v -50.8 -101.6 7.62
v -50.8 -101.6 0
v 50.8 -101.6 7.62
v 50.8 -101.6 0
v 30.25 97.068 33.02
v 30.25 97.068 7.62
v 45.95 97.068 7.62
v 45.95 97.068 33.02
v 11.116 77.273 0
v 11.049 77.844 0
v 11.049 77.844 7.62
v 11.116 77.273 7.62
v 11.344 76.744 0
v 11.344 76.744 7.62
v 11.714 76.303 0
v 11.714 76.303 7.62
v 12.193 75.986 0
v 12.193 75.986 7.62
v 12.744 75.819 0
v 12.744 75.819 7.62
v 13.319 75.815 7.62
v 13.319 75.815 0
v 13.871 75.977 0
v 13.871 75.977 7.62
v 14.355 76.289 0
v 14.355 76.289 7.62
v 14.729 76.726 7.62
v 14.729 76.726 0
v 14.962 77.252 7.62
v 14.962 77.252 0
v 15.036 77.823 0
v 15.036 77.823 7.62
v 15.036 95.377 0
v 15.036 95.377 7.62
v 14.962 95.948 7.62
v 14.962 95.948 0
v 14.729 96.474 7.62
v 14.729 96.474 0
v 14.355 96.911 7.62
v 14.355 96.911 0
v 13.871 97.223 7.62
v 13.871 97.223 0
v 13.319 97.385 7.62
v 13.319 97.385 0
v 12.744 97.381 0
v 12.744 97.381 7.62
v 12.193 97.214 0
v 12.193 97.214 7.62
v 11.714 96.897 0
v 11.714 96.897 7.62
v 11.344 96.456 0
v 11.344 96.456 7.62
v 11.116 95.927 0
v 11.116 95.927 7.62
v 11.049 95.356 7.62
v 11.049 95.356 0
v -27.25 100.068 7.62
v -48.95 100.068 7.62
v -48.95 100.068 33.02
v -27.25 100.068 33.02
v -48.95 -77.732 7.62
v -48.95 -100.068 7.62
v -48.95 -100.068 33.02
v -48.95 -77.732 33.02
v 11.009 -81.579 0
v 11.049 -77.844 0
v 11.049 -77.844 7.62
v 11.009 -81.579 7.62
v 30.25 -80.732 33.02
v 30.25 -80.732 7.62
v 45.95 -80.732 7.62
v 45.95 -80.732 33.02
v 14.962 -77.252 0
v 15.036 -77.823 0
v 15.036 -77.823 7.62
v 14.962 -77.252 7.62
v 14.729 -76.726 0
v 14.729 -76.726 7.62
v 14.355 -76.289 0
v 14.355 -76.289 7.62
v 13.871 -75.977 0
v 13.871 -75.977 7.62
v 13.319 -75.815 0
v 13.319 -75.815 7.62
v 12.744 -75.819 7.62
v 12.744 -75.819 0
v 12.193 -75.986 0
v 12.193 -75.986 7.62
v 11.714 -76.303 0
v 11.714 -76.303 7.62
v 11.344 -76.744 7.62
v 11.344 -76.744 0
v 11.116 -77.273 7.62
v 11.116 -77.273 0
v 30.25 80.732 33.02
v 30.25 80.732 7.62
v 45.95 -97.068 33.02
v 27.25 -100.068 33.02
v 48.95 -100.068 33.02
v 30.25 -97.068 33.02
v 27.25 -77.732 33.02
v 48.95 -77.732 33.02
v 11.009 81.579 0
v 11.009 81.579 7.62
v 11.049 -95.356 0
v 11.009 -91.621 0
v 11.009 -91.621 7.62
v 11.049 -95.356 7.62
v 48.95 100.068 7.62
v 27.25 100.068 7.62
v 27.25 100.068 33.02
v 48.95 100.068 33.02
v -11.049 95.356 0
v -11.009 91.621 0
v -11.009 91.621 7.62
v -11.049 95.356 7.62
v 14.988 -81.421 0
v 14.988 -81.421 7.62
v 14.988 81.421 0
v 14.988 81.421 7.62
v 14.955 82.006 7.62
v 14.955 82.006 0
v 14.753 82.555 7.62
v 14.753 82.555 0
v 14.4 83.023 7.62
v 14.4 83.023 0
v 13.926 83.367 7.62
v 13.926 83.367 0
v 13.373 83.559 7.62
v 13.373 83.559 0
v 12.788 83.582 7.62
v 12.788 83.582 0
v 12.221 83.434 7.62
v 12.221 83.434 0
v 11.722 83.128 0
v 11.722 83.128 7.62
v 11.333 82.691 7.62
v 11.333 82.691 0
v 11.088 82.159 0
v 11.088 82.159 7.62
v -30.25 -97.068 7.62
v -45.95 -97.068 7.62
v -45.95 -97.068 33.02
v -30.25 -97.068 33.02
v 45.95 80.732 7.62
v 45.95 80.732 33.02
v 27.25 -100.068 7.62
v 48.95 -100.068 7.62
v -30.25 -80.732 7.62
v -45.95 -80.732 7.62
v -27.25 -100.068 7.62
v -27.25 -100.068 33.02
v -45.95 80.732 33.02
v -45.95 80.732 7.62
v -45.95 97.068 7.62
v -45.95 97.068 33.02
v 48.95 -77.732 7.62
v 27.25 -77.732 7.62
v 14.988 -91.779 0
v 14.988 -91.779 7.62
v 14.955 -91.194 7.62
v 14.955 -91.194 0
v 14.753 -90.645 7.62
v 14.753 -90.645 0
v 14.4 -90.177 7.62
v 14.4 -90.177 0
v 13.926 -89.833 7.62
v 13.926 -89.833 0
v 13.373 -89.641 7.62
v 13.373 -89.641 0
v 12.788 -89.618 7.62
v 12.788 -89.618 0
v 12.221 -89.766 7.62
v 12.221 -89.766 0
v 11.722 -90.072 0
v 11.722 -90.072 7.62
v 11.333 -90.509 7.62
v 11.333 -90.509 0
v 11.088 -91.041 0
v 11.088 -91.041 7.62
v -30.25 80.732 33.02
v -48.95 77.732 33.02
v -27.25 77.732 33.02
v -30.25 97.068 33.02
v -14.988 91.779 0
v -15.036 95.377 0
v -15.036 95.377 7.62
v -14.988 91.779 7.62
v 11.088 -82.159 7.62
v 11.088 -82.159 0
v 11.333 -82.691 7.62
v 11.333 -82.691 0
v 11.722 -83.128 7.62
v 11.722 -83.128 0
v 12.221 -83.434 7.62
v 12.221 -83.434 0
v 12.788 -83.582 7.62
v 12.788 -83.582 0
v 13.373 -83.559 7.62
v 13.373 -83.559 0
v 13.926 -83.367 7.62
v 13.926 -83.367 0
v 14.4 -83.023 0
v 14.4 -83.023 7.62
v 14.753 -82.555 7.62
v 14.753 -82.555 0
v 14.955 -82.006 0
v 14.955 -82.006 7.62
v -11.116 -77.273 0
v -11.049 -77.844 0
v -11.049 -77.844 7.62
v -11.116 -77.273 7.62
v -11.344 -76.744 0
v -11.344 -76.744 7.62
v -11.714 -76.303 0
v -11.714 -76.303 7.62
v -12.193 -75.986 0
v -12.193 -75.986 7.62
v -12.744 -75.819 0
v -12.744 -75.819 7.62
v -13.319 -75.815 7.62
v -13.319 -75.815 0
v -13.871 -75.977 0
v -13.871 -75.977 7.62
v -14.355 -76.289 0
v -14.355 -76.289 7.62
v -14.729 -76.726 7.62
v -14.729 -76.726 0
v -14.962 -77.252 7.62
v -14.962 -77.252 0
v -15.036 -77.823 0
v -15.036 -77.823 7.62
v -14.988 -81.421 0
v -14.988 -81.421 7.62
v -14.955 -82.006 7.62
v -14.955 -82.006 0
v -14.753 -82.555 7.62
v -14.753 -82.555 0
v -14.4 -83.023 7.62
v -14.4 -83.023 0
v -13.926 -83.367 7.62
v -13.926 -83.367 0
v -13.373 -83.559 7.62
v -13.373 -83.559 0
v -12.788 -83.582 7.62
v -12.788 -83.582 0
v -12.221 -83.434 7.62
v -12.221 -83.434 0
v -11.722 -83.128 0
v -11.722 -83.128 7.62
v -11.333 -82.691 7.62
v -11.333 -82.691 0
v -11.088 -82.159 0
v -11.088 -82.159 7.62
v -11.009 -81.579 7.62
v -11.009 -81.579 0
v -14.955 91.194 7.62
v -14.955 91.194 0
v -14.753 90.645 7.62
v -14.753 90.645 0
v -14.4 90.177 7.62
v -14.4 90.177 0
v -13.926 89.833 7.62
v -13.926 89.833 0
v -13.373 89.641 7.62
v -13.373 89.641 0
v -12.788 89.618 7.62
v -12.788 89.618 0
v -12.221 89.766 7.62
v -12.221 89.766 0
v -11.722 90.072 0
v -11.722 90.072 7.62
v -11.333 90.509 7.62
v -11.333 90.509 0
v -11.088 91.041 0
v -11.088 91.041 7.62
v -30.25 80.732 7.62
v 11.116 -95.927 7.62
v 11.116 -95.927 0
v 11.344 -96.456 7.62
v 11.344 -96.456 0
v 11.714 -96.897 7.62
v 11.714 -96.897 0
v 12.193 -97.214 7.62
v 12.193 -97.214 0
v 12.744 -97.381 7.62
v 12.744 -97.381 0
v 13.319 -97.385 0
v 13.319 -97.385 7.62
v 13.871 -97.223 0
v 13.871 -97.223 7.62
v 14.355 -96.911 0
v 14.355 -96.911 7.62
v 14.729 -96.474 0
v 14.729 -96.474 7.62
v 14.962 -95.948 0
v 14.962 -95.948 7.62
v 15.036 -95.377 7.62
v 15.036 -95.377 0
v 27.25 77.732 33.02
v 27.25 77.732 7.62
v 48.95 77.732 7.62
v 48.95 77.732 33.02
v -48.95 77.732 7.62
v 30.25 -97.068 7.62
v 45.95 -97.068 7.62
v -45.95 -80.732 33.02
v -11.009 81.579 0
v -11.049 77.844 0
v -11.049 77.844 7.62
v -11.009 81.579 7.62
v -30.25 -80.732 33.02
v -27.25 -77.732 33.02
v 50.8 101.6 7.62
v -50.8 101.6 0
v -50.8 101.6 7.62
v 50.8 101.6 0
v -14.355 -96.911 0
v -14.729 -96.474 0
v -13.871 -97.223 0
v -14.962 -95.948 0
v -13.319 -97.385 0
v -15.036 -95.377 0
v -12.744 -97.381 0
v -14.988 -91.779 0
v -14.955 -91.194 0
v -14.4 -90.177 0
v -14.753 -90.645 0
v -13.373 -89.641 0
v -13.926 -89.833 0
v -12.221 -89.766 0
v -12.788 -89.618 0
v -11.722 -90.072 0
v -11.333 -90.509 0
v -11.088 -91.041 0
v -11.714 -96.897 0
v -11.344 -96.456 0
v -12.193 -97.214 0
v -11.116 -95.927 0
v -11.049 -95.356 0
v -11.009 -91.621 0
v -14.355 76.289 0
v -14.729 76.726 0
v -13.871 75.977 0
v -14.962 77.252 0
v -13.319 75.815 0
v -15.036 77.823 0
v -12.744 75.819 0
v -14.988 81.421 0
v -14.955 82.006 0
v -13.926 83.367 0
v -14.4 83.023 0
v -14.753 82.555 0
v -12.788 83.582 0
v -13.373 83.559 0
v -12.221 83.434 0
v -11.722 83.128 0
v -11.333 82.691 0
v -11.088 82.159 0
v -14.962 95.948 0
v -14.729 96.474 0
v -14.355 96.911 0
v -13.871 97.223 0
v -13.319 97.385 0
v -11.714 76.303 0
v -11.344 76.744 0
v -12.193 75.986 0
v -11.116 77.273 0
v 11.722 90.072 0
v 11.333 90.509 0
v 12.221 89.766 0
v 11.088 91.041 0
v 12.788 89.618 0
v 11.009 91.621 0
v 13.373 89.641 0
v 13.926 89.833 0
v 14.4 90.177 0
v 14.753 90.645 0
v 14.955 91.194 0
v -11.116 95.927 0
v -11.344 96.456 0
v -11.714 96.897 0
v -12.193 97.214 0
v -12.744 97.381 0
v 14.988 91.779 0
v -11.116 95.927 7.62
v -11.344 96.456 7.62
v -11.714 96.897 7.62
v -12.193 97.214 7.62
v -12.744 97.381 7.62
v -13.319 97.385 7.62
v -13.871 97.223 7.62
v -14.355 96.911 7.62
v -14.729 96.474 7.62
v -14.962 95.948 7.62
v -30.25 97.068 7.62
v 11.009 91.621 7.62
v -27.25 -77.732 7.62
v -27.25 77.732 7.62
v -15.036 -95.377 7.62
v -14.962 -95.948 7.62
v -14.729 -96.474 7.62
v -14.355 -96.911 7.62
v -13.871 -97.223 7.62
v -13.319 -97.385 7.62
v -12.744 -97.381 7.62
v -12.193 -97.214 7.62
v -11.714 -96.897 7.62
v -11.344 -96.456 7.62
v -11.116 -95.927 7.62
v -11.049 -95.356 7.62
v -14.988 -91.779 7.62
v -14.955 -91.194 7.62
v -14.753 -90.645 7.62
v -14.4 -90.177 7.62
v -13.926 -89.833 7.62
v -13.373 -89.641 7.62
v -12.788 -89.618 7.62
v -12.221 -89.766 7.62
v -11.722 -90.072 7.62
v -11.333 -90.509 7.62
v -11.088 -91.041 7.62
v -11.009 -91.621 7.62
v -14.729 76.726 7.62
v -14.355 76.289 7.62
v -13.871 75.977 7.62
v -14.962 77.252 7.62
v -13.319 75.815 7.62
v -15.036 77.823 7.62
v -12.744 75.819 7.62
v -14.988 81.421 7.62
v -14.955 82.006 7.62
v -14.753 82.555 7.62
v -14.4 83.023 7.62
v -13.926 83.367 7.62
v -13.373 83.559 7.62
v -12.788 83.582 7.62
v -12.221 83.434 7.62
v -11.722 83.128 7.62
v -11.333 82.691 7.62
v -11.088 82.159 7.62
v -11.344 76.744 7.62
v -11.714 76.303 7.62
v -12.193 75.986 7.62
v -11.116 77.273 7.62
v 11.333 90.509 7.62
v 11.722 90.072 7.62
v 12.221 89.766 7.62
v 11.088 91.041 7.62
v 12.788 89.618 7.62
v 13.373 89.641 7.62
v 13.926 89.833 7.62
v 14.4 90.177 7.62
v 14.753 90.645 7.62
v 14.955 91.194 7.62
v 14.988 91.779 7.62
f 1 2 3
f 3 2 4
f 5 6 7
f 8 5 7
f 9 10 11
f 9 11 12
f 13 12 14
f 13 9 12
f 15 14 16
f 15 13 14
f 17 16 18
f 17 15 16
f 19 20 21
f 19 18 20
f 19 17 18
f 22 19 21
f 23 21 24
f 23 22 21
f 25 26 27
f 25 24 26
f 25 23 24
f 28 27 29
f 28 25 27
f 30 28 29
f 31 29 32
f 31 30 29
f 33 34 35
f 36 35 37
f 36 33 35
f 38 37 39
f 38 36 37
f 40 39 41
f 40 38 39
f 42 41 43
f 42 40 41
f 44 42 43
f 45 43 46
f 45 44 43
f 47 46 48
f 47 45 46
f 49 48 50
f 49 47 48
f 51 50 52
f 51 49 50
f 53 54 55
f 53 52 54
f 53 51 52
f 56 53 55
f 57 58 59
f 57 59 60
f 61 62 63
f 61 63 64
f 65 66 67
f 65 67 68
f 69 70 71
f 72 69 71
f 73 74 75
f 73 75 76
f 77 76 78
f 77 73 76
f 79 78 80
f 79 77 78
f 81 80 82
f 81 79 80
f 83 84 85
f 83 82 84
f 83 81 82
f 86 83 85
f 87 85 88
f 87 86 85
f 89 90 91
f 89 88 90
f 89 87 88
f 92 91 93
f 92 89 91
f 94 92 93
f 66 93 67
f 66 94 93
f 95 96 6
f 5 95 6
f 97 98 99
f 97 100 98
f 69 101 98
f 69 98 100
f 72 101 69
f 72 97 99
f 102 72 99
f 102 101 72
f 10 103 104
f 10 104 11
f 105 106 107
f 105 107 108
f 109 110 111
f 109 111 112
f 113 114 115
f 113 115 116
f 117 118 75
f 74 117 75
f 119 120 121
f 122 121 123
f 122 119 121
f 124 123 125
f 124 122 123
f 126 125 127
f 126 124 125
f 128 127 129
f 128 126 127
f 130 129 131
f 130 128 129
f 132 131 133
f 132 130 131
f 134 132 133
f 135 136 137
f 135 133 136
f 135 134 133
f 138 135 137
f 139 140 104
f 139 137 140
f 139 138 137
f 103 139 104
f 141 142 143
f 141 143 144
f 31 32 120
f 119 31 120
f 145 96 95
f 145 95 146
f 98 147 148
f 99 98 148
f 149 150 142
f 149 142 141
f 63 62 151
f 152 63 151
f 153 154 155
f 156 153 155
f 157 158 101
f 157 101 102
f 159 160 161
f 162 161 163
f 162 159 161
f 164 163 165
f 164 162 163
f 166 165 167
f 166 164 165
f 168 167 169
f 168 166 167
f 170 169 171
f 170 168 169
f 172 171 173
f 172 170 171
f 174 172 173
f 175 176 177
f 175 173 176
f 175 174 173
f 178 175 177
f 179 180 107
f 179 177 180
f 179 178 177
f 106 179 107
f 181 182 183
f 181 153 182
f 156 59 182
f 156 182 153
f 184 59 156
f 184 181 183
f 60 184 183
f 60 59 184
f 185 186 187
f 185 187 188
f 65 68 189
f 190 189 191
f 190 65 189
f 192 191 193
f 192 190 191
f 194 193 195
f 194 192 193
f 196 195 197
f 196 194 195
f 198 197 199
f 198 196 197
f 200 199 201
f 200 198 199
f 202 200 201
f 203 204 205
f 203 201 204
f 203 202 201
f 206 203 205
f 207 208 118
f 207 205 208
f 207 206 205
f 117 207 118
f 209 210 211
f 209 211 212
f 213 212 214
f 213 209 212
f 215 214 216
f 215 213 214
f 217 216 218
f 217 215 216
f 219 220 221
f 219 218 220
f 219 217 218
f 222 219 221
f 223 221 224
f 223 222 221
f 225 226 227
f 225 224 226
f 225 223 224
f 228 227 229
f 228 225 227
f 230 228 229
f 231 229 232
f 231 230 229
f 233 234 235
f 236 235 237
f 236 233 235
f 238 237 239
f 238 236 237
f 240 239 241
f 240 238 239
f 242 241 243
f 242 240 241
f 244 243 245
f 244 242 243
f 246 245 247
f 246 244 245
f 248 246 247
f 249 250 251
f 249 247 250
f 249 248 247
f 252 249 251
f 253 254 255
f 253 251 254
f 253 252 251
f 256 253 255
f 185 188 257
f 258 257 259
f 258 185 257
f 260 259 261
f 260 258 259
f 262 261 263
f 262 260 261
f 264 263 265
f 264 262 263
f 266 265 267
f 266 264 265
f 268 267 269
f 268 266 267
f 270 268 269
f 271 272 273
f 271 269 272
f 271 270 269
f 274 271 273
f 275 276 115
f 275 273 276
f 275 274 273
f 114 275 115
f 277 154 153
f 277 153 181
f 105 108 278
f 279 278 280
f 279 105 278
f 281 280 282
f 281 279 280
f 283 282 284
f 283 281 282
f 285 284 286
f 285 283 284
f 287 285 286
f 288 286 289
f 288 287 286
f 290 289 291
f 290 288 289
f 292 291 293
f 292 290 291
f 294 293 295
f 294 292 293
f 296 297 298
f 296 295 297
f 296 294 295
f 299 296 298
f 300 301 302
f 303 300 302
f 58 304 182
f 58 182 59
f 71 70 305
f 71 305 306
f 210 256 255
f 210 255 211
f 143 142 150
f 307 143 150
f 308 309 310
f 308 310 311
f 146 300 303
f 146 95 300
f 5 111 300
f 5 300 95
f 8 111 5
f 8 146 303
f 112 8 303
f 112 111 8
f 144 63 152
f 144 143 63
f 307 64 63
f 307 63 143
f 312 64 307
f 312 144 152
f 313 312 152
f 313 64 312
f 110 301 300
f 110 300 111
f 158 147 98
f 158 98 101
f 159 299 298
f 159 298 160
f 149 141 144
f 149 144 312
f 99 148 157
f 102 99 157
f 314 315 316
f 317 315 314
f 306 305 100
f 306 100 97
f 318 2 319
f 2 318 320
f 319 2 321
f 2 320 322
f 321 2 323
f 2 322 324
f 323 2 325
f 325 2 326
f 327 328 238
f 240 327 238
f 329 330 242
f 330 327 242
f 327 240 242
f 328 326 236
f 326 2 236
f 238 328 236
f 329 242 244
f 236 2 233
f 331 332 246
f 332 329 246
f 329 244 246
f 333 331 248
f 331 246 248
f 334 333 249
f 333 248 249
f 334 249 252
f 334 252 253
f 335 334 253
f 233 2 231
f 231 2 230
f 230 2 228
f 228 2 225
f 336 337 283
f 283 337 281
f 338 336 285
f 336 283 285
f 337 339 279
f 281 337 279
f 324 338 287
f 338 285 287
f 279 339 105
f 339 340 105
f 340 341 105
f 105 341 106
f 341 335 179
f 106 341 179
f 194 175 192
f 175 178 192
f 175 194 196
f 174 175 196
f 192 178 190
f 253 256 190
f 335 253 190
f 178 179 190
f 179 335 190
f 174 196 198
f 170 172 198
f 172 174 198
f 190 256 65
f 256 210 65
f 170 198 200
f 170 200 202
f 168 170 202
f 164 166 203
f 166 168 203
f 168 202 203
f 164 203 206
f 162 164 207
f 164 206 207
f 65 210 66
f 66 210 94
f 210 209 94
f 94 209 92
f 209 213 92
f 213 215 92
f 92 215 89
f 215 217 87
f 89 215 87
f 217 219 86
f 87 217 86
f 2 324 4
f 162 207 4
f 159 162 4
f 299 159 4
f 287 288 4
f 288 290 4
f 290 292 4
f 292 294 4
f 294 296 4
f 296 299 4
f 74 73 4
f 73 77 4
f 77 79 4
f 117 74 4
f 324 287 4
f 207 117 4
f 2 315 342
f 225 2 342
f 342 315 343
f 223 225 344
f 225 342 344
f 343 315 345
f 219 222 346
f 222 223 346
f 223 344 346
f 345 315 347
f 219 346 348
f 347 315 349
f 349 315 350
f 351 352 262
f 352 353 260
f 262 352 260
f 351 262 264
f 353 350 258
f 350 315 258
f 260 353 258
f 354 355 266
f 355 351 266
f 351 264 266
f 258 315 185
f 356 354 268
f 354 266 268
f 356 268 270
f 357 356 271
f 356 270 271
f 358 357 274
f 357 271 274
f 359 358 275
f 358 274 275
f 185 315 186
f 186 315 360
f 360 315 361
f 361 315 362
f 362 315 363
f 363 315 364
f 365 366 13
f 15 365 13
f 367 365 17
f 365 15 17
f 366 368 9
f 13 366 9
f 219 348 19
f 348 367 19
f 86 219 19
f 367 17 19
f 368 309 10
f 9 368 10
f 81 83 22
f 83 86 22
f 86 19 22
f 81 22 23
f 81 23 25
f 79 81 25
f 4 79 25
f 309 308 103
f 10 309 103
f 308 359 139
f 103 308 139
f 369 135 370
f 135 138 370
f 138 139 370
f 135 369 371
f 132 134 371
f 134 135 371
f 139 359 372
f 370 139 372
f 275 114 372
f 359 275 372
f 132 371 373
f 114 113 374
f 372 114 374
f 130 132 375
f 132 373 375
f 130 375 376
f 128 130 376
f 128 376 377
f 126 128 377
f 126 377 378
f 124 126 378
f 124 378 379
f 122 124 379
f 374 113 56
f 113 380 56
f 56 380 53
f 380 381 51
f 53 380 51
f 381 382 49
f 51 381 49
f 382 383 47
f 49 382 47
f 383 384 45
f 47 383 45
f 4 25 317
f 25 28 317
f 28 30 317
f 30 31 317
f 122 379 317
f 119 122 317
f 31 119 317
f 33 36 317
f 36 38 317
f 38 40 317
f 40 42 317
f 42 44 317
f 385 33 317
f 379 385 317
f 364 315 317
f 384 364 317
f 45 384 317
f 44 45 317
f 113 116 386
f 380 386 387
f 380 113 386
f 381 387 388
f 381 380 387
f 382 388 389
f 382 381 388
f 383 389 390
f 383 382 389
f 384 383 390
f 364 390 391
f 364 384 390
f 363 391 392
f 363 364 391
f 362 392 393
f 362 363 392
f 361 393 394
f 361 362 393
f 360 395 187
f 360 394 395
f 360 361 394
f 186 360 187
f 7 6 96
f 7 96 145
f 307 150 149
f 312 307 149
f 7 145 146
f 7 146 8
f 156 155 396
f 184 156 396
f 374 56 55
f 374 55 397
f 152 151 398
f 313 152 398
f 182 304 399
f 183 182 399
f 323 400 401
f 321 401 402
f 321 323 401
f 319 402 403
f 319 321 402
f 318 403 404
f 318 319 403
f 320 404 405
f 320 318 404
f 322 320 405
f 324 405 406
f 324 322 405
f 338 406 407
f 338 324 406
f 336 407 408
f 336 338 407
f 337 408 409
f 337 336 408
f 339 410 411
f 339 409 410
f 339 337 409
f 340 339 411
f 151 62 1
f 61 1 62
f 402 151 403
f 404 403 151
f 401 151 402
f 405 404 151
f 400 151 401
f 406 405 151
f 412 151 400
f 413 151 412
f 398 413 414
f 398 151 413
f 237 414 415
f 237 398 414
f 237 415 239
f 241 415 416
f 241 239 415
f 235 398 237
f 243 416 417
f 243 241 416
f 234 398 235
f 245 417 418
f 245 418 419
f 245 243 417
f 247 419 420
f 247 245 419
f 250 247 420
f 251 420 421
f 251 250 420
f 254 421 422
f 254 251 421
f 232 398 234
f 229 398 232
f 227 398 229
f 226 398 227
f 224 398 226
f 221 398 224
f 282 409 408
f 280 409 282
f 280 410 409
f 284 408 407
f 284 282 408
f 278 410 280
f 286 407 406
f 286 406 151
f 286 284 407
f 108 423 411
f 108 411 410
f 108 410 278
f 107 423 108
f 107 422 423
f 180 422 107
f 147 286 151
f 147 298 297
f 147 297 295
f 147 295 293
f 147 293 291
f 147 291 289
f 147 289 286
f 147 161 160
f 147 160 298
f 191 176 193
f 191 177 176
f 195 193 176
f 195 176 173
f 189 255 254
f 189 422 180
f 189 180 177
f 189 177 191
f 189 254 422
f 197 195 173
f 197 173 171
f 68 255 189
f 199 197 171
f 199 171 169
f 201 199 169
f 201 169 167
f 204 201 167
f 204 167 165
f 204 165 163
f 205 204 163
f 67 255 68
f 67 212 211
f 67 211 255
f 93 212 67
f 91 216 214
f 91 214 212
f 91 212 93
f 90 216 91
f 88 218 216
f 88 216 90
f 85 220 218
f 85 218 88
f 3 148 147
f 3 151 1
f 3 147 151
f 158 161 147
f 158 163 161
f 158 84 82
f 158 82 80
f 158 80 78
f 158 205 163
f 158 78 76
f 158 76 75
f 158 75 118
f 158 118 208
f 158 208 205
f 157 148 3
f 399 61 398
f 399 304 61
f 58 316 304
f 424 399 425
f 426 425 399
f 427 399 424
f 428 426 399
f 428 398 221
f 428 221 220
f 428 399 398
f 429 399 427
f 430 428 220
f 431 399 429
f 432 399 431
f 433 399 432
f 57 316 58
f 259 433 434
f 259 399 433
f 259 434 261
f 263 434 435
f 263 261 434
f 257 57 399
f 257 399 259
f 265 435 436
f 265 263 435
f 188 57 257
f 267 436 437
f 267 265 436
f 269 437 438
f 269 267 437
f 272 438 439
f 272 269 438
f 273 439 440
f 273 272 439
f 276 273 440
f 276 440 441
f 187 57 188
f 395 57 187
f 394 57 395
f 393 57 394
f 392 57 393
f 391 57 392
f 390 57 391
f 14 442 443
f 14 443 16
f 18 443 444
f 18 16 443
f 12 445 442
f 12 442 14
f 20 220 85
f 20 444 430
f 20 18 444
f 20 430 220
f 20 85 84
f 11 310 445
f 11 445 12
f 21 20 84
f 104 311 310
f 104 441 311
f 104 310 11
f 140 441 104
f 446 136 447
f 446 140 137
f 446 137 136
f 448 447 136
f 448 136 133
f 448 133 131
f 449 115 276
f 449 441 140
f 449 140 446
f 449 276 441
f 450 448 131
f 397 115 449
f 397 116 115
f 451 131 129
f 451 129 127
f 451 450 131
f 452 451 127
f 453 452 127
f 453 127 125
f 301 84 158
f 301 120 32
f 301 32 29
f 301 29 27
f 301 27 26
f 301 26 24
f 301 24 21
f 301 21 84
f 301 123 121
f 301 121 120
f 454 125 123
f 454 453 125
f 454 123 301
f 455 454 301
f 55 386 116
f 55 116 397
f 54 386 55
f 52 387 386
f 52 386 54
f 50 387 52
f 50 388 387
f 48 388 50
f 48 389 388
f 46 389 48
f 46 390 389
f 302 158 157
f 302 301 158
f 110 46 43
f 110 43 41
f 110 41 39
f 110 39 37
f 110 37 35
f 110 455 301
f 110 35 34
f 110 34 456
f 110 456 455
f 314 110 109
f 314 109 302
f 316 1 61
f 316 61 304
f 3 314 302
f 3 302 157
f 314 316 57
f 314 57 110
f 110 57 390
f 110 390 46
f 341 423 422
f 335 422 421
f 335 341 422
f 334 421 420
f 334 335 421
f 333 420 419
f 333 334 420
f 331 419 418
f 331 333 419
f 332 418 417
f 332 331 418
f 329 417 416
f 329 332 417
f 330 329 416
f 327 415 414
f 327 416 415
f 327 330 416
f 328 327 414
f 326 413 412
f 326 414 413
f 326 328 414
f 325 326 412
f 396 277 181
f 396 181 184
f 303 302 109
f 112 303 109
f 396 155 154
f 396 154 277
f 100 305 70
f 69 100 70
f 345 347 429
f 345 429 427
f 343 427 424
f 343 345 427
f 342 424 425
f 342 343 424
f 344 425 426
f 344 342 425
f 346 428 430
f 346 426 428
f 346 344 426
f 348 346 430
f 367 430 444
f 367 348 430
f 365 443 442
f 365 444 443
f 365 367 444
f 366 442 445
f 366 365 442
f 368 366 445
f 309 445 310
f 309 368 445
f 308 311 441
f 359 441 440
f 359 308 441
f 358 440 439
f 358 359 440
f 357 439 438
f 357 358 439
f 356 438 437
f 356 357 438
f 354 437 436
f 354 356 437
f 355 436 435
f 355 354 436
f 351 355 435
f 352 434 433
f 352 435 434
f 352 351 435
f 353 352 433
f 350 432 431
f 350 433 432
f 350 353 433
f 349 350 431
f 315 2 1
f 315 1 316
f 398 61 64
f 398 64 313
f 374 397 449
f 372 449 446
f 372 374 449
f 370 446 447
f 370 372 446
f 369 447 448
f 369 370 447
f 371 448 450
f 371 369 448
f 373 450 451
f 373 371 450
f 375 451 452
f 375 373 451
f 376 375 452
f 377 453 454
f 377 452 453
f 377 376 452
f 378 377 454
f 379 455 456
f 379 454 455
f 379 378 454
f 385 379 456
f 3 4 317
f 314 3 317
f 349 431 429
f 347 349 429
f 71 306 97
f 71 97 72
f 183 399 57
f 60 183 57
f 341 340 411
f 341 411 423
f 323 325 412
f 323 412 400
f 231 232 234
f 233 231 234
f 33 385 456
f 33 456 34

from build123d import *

# Parameters (mm, degrees)
F0_W     = 101.6
F0_H     = 203.2
F1_DEPTH = 7.62
F3_DEPTH = 25.4
F4_W     = 21.7
F4_H     = 22.33677
F4_W_2   = 15.7
F4_H_2   = 16.33677
F5_DEPTH = 25.4


with BuildPart() as f1:
    # F0 (on Top) → F1 (new body)
    with BuildSketch(Plane.XY):
        Rectangle(F0_W, F0_H)
    extrude(amount=F1_DEPTH)

    # F2 (on Top) → F3 (cut)
    with BuildSketch(Plane.XY):
        with BuildLine():
            Line((-15.035691, -77.822713), (-14.988321, -81.421245))
            ThreePointArc((-14.988321, -81.421245), (-13.081192, -83.592345), (-11.008666, -81.578528))
            Line((-11.008666, -81.578528), (-11.048887, -77.843856))
            ThreePointArc((-11.048887, -77.843856), (-13.031485, -75.796128), (-15.035691, -77.822713))
        make_face()
        with BuildLine():
            ThreePointArc((-15.035691, -95.377287), (-13.031485, -97.403872), (-11.048887, -95.356144))
            Line((-11.048887, -95.356144), (-11.008666, -91.621472))
            ThreePointArc((-11.008666, -91.621472), (-13.081192, -89.607655), (-14.988321, -91.778755))
            Line((-14.988321, -91.778755), (-15.035691, -95.377287))
        make_face()
        with BuildLine():
            ThreePointArc((15.035691, -77.822713), (13.031485, -75.796128), (11.048887, -77.843856))
            Line((11.048887, -77.843856), (11.008666, -81.578528))
            ThreePointArc((11.008666, -81.578528), (13.081192, -83.592345), (14.988321, -81.421245))
            Line((14.988321, -81.421245), (15.035691, -77.822713))
        make_face()
        with BuildLine():
            Line((11.008666, -91.621472), (11.048887, -95.356144))
            ThreePointArc((11.048887, -95.356144), (13.031485, -97.403872), (15.035691, -95.377287))
            Line((15.035691, -95.377287), (14.988321, -91.778755))
            ThreePointArc((14.988321, -91.778755), (13.081192, -89.607655), (11.008666, -91.621472))
        make_face()
        with BuildLine():
            ThreePointArc((15.035691, 95.377287), (13.031485, 97.403872), (11.048887, 95.356144))
            Line((11.048887, 95.356144), (11.008666, 91.621472))
            ThreePointArc((11.008666, 91.621472), (13.081192, 89.607655), (14.988321, 91.778755))
            Line((14.988321, 91.778755), (15.035691, 95.377287))
        make_face()
        with BuildLine():
            Line((-11.008666, 91.621472), (-11.048887, 95.356144))
            ThreePointArc((-11.048887, 95.356144), (-13.031485, 97.403872), (-15.035691, 95.377287))
            Line((-15.035691, 95.377287), (-14.988321, 91.778755))
            ThreePointArc((-14.988321, 91.778755), (-13.081192, 89.607655), (-11.008666, 91.621472))
        make_face()
        with BuildLine():
            ThreePointArc((-15.035691, 77.822713), (-13.031485, 75.796128), (-11.048887, 77.843856))
            Line((-11.048887, 77.843856), (-11.008666, 81.578528))
            ThreePointArc((-11.008666, 81.578528), (-13.081192, 83.592345), (-14.988321, 81.421245))
            Line((-14.988321, 81.421245), (-15.035691, 77.822713))
        make_face()
        with BuildLine():
            ThreePointArc((11.048887, 77.843856), (13.031485, 75.796128), (15.035691, 77.822713))
            Line((15.035691, 77.822713), (14.988321, 81.421245))
            ThreePointArc((14.988321, 81.421245), (13.081192, 83.592345), (11.008666, 81.578528))
            Line((11.008666, 81.578528), (11.048887, 77.843856))
        make_face()
    extrude(amount=F3_DEPTH, mode=Mode.SUBTRACT)

    # F4 (on face) → F5 (join)
    with BuildSketch(Plane.XY.offset(7.62)):
        with Locations((38.1, 88.9)):
            Rectangle(F4_W, F4_H)
        with Locations((38.1, 88.9)):
            Rectangle(F4_W_2, F4_H_2, mode=Mode.SUBTRACT)
        with Locations((38.1, -88.9)):
            Rectangle(F4_W, F4_H)
        with Locations((38.1, -88.9)):
            Rectangle(F4_W_2, F4_H_2, mode=Mode.SUBTRACT)
        with Locations((-38.1, 88.9)):
            Rectangle(F4_W, F4_H)
        with Locations((-38.1, 88.9)):
            Rectangle(F4_W_2, F4_H_2, mode=Mode.SUBTRACT)
        with Locations((-38.1, -88.9)):
            Rectangle(F4_W, F4_H)
        with Locations((-38.1, -88.9)):
            Rectangle(F4_W_2, F4_H_2, mode=Mode.SUBTRACT)
    extrude(amount=F5_DEPTH)


solid = f1.part
